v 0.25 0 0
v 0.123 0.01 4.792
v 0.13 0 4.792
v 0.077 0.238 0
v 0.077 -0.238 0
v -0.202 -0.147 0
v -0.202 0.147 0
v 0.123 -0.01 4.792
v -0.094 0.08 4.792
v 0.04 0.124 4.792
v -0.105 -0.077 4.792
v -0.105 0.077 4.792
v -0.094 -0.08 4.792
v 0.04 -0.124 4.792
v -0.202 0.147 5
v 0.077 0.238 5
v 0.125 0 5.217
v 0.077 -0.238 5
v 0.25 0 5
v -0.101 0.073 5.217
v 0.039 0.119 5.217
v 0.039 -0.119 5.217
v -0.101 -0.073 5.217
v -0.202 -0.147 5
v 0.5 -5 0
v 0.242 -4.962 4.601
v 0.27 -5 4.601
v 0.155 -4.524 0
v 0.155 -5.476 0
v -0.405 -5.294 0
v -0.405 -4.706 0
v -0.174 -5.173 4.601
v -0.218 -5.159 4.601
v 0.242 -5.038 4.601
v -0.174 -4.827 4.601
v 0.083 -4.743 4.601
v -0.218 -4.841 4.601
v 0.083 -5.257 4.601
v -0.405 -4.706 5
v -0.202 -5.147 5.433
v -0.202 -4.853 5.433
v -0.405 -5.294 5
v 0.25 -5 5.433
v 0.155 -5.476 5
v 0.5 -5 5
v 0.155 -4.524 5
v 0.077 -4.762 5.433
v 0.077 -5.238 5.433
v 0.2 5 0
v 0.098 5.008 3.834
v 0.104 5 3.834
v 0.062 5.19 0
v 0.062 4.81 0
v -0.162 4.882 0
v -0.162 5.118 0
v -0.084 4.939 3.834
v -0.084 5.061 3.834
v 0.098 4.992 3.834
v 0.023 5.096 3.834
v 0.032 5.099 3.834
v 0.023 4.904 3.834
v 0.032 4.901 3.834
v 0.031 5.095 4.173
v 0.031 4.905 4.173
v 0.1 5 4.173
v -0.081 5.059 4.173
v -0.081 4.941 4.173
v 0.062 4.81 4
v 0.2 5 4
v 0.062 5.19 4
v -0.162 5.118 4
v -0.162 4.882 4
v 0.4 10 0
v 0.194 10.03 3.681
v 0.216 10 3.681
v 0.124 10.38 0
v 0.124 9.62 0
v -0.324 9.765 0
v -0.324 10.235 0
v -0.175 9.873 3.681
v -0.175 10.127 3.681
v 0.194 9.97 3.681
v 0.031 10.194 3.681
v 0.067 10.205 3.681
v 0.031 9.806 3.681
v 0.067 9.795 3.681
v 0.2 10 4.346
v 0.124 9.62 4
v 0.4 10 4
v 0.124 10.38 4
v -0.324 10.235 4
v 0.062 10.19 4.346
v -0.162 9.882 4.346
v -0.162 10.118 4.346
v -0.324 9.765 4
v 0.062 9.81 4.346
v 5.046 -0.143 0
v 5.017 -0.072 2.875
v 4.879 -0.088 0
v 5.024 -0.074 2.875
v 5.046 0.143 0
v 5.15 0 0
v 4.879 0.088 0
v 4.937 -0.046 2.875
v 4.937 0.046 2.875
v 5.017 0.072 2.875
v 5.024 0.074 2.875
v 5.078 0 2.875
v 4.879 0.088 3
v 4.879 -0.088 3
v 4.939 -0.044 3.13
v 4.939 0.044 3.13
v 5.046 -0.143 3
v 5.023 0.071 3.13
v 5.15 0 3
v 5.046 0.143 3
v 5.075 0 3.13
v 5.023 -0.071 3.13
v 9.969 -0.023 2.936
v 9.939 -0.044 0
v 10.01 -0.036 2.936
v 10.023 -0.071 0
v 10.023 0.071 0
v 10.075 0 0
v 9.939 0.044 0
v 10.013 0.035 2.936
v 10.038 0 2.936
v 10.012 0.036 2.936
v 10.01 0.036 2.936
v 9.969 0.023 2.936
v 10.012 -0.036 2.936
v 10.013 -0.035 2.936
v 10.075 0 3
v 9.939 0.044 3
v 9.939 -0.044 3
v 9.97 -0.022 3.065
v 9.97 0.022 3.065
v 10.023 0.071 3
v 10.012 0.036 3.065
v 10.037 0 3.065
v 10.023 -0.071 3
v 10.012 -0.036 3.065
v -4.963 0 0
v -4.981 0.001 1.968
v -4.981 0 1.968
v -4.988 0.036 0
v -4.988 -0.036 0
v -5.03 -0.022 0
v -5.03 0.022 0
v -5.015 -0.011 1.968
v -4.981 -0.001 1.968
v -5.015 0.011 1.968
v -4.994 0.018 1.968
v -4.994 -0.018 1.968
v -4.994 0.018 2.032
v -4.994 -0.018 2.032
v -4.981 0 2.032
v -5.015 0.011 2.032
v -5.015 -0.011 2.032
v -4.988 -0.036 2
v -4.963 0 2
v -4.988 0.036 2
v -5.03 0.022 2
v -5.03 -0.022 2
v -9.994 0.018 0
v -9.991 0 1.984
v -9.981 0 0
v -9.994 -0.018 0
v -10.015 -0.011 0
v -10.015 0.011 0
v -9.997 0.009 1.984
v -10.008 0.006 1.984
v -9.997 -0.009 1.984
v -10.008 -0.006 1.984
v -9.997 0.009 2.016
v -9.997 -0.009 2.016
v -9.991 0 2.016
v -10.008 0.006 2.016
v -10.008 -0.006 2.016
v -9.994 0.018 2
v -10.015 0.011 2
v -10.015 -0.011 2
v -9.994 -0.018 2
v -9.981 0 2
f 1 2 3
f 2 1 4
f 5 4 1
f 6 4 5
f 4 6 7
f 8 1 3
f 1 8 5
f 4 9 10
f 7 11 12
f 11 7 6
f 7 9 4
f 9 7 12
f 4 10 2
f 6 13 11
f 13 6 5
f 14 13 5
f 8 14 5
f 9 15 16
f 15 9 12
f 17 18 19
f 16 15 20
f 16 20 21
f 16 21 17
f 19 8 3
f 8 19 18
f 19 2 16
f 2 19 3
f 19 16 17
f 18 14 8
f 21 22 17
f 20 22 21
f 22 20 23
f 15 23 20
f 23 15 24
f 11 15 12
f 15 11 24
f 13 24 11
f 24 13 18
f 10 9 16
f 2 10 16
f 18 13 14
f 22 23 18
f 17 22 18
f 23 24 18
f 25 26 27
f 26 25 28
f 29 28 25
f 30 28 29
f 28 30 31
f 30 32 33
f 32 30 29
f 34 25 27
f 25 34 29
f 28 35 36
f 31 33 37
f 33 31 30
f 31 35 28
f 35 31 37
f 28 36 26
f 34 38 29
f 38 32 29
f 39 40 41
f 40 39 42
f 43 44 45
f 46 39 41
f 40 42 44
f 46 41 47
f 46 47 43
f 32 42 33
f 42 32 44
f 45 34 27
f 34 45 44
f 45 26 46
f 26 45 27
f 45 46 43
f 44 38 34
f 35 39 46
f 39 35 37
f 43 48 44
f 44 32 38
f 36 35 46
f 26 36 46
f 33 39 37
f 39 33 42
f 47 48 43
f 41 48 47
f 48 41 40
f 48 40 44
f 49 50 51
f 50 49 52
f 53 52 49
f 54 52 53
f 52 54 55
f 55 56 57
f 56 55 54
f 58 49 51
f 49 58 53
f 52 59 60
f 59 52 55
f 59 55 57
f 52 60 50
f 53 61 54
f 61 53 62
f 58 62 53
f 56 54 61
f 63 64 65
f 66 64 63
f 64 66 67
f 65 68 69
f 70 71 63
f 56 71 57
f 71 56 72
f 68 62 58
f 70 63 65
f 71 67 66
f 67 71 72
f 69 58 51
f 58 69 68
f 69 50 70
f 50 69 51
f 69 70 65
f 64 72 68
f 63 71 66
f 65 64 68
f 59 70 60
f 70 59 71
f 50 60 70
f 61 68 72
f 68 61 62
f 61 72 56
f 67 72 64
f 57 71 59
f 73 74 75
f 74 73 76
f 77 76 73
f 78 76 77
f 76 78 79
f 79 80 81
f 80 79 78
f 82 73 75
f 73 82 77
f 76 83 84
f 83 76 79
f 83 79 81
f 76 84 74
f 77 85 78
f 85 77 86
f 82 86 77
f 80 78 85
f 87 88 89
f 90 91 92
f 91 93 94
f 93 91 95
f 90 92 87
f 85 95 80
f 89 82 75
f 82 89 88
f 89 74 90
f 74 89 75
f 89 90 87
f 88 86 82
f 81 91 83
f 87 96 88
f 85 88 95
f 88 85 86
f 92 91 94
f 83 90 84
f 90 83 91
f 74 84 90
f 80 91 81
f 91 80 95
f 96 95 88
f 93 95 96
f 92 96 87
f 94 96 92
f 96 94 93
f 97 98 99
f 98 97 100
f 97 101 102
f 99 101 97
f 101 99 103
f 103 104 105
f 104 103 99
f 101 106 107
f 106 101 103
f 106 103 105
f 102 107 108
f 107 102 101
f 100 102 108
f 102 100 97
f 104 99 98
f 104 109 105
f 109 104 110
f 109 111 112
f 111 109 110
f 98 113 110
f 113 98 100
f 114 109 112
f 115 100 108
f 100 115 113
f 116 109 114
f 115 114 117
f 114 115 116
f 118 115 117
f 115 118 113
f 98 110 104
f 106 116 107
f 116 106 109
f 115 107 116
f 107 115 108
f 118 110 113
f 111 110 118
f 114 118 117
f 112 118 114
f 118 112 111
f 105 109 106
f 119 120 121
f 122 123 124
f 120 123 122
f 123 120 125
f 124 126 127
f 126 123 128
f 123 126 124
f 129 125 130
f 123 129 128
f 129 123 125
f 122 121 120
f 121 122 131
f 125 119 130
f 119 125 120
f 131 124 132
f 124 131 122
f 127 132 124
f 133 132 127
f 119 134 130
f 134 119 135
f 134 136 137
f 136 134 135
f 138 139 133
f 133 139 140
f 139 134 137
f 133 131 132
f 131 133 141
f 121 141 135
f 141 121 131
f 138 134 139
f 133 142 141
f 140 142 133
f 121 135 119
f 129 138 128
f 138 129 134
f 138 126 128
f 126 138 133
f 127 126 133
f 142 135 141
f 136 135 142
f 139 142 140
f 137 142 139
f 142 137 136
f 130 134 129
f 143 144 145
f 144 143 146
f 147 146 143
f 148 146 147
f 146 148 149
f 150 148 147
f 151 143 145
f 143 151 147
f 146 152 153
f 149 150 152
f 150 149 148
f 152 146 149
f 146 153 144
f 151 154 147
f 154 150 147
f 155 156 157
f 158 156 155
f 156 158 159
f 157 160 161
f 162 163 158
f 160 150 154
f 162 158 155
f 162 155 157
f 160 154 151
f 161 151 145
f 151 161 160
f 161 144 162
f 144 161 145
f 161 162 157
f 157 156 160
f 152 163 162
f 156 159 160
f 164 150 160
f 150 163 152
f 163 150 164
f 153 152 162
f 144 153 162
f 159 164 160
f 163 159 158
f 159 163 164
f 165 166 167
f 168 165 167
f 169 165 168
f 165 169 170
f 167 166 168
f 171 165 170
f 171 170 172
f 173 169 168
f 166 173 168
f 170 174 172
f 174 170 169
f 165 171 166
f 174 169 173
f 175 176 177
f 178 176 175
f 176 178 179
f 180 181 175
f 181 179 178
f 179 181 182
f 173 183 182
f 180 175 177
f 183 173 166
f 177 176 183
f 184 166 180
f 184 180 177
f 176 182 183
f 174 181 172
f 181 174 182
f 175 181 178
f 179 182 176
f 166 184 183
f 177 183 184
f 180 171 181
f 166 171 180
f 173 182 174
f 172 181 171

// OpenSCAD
module Bristle(height, botRad, topRad, sphereRad){
    union() {
        cylinder(height, botRad, topRad);
        translate([0, 0, height]){
            sphere(sphereRad);
        }
    }
}

translate([0,0,0])
Bristle(5, 0.25, 0.125, 0.25);
translate([0,-5,0])
Bristle(5, 0.5, 0.25, 0.5);

translate([0,5,0])
Bristle(4, 0.2, 0.1, 0.2);
translate([0,10,0])
Bristle(4, 0.4, 0.2, 0.4);

translate([5,0,0])
Bristle(3, 0.15, 0.075, 0.15);
translate([10,0,0])
Bristle(3, 0.075, 0.0375, 0.075);

translate([-5,0,0])
Bristle(2, 0.0375, 0.01875, 0.0375);
translate([-10,0,0])
Bristle(2, 0.01875, 0.009375, 0.01875);
